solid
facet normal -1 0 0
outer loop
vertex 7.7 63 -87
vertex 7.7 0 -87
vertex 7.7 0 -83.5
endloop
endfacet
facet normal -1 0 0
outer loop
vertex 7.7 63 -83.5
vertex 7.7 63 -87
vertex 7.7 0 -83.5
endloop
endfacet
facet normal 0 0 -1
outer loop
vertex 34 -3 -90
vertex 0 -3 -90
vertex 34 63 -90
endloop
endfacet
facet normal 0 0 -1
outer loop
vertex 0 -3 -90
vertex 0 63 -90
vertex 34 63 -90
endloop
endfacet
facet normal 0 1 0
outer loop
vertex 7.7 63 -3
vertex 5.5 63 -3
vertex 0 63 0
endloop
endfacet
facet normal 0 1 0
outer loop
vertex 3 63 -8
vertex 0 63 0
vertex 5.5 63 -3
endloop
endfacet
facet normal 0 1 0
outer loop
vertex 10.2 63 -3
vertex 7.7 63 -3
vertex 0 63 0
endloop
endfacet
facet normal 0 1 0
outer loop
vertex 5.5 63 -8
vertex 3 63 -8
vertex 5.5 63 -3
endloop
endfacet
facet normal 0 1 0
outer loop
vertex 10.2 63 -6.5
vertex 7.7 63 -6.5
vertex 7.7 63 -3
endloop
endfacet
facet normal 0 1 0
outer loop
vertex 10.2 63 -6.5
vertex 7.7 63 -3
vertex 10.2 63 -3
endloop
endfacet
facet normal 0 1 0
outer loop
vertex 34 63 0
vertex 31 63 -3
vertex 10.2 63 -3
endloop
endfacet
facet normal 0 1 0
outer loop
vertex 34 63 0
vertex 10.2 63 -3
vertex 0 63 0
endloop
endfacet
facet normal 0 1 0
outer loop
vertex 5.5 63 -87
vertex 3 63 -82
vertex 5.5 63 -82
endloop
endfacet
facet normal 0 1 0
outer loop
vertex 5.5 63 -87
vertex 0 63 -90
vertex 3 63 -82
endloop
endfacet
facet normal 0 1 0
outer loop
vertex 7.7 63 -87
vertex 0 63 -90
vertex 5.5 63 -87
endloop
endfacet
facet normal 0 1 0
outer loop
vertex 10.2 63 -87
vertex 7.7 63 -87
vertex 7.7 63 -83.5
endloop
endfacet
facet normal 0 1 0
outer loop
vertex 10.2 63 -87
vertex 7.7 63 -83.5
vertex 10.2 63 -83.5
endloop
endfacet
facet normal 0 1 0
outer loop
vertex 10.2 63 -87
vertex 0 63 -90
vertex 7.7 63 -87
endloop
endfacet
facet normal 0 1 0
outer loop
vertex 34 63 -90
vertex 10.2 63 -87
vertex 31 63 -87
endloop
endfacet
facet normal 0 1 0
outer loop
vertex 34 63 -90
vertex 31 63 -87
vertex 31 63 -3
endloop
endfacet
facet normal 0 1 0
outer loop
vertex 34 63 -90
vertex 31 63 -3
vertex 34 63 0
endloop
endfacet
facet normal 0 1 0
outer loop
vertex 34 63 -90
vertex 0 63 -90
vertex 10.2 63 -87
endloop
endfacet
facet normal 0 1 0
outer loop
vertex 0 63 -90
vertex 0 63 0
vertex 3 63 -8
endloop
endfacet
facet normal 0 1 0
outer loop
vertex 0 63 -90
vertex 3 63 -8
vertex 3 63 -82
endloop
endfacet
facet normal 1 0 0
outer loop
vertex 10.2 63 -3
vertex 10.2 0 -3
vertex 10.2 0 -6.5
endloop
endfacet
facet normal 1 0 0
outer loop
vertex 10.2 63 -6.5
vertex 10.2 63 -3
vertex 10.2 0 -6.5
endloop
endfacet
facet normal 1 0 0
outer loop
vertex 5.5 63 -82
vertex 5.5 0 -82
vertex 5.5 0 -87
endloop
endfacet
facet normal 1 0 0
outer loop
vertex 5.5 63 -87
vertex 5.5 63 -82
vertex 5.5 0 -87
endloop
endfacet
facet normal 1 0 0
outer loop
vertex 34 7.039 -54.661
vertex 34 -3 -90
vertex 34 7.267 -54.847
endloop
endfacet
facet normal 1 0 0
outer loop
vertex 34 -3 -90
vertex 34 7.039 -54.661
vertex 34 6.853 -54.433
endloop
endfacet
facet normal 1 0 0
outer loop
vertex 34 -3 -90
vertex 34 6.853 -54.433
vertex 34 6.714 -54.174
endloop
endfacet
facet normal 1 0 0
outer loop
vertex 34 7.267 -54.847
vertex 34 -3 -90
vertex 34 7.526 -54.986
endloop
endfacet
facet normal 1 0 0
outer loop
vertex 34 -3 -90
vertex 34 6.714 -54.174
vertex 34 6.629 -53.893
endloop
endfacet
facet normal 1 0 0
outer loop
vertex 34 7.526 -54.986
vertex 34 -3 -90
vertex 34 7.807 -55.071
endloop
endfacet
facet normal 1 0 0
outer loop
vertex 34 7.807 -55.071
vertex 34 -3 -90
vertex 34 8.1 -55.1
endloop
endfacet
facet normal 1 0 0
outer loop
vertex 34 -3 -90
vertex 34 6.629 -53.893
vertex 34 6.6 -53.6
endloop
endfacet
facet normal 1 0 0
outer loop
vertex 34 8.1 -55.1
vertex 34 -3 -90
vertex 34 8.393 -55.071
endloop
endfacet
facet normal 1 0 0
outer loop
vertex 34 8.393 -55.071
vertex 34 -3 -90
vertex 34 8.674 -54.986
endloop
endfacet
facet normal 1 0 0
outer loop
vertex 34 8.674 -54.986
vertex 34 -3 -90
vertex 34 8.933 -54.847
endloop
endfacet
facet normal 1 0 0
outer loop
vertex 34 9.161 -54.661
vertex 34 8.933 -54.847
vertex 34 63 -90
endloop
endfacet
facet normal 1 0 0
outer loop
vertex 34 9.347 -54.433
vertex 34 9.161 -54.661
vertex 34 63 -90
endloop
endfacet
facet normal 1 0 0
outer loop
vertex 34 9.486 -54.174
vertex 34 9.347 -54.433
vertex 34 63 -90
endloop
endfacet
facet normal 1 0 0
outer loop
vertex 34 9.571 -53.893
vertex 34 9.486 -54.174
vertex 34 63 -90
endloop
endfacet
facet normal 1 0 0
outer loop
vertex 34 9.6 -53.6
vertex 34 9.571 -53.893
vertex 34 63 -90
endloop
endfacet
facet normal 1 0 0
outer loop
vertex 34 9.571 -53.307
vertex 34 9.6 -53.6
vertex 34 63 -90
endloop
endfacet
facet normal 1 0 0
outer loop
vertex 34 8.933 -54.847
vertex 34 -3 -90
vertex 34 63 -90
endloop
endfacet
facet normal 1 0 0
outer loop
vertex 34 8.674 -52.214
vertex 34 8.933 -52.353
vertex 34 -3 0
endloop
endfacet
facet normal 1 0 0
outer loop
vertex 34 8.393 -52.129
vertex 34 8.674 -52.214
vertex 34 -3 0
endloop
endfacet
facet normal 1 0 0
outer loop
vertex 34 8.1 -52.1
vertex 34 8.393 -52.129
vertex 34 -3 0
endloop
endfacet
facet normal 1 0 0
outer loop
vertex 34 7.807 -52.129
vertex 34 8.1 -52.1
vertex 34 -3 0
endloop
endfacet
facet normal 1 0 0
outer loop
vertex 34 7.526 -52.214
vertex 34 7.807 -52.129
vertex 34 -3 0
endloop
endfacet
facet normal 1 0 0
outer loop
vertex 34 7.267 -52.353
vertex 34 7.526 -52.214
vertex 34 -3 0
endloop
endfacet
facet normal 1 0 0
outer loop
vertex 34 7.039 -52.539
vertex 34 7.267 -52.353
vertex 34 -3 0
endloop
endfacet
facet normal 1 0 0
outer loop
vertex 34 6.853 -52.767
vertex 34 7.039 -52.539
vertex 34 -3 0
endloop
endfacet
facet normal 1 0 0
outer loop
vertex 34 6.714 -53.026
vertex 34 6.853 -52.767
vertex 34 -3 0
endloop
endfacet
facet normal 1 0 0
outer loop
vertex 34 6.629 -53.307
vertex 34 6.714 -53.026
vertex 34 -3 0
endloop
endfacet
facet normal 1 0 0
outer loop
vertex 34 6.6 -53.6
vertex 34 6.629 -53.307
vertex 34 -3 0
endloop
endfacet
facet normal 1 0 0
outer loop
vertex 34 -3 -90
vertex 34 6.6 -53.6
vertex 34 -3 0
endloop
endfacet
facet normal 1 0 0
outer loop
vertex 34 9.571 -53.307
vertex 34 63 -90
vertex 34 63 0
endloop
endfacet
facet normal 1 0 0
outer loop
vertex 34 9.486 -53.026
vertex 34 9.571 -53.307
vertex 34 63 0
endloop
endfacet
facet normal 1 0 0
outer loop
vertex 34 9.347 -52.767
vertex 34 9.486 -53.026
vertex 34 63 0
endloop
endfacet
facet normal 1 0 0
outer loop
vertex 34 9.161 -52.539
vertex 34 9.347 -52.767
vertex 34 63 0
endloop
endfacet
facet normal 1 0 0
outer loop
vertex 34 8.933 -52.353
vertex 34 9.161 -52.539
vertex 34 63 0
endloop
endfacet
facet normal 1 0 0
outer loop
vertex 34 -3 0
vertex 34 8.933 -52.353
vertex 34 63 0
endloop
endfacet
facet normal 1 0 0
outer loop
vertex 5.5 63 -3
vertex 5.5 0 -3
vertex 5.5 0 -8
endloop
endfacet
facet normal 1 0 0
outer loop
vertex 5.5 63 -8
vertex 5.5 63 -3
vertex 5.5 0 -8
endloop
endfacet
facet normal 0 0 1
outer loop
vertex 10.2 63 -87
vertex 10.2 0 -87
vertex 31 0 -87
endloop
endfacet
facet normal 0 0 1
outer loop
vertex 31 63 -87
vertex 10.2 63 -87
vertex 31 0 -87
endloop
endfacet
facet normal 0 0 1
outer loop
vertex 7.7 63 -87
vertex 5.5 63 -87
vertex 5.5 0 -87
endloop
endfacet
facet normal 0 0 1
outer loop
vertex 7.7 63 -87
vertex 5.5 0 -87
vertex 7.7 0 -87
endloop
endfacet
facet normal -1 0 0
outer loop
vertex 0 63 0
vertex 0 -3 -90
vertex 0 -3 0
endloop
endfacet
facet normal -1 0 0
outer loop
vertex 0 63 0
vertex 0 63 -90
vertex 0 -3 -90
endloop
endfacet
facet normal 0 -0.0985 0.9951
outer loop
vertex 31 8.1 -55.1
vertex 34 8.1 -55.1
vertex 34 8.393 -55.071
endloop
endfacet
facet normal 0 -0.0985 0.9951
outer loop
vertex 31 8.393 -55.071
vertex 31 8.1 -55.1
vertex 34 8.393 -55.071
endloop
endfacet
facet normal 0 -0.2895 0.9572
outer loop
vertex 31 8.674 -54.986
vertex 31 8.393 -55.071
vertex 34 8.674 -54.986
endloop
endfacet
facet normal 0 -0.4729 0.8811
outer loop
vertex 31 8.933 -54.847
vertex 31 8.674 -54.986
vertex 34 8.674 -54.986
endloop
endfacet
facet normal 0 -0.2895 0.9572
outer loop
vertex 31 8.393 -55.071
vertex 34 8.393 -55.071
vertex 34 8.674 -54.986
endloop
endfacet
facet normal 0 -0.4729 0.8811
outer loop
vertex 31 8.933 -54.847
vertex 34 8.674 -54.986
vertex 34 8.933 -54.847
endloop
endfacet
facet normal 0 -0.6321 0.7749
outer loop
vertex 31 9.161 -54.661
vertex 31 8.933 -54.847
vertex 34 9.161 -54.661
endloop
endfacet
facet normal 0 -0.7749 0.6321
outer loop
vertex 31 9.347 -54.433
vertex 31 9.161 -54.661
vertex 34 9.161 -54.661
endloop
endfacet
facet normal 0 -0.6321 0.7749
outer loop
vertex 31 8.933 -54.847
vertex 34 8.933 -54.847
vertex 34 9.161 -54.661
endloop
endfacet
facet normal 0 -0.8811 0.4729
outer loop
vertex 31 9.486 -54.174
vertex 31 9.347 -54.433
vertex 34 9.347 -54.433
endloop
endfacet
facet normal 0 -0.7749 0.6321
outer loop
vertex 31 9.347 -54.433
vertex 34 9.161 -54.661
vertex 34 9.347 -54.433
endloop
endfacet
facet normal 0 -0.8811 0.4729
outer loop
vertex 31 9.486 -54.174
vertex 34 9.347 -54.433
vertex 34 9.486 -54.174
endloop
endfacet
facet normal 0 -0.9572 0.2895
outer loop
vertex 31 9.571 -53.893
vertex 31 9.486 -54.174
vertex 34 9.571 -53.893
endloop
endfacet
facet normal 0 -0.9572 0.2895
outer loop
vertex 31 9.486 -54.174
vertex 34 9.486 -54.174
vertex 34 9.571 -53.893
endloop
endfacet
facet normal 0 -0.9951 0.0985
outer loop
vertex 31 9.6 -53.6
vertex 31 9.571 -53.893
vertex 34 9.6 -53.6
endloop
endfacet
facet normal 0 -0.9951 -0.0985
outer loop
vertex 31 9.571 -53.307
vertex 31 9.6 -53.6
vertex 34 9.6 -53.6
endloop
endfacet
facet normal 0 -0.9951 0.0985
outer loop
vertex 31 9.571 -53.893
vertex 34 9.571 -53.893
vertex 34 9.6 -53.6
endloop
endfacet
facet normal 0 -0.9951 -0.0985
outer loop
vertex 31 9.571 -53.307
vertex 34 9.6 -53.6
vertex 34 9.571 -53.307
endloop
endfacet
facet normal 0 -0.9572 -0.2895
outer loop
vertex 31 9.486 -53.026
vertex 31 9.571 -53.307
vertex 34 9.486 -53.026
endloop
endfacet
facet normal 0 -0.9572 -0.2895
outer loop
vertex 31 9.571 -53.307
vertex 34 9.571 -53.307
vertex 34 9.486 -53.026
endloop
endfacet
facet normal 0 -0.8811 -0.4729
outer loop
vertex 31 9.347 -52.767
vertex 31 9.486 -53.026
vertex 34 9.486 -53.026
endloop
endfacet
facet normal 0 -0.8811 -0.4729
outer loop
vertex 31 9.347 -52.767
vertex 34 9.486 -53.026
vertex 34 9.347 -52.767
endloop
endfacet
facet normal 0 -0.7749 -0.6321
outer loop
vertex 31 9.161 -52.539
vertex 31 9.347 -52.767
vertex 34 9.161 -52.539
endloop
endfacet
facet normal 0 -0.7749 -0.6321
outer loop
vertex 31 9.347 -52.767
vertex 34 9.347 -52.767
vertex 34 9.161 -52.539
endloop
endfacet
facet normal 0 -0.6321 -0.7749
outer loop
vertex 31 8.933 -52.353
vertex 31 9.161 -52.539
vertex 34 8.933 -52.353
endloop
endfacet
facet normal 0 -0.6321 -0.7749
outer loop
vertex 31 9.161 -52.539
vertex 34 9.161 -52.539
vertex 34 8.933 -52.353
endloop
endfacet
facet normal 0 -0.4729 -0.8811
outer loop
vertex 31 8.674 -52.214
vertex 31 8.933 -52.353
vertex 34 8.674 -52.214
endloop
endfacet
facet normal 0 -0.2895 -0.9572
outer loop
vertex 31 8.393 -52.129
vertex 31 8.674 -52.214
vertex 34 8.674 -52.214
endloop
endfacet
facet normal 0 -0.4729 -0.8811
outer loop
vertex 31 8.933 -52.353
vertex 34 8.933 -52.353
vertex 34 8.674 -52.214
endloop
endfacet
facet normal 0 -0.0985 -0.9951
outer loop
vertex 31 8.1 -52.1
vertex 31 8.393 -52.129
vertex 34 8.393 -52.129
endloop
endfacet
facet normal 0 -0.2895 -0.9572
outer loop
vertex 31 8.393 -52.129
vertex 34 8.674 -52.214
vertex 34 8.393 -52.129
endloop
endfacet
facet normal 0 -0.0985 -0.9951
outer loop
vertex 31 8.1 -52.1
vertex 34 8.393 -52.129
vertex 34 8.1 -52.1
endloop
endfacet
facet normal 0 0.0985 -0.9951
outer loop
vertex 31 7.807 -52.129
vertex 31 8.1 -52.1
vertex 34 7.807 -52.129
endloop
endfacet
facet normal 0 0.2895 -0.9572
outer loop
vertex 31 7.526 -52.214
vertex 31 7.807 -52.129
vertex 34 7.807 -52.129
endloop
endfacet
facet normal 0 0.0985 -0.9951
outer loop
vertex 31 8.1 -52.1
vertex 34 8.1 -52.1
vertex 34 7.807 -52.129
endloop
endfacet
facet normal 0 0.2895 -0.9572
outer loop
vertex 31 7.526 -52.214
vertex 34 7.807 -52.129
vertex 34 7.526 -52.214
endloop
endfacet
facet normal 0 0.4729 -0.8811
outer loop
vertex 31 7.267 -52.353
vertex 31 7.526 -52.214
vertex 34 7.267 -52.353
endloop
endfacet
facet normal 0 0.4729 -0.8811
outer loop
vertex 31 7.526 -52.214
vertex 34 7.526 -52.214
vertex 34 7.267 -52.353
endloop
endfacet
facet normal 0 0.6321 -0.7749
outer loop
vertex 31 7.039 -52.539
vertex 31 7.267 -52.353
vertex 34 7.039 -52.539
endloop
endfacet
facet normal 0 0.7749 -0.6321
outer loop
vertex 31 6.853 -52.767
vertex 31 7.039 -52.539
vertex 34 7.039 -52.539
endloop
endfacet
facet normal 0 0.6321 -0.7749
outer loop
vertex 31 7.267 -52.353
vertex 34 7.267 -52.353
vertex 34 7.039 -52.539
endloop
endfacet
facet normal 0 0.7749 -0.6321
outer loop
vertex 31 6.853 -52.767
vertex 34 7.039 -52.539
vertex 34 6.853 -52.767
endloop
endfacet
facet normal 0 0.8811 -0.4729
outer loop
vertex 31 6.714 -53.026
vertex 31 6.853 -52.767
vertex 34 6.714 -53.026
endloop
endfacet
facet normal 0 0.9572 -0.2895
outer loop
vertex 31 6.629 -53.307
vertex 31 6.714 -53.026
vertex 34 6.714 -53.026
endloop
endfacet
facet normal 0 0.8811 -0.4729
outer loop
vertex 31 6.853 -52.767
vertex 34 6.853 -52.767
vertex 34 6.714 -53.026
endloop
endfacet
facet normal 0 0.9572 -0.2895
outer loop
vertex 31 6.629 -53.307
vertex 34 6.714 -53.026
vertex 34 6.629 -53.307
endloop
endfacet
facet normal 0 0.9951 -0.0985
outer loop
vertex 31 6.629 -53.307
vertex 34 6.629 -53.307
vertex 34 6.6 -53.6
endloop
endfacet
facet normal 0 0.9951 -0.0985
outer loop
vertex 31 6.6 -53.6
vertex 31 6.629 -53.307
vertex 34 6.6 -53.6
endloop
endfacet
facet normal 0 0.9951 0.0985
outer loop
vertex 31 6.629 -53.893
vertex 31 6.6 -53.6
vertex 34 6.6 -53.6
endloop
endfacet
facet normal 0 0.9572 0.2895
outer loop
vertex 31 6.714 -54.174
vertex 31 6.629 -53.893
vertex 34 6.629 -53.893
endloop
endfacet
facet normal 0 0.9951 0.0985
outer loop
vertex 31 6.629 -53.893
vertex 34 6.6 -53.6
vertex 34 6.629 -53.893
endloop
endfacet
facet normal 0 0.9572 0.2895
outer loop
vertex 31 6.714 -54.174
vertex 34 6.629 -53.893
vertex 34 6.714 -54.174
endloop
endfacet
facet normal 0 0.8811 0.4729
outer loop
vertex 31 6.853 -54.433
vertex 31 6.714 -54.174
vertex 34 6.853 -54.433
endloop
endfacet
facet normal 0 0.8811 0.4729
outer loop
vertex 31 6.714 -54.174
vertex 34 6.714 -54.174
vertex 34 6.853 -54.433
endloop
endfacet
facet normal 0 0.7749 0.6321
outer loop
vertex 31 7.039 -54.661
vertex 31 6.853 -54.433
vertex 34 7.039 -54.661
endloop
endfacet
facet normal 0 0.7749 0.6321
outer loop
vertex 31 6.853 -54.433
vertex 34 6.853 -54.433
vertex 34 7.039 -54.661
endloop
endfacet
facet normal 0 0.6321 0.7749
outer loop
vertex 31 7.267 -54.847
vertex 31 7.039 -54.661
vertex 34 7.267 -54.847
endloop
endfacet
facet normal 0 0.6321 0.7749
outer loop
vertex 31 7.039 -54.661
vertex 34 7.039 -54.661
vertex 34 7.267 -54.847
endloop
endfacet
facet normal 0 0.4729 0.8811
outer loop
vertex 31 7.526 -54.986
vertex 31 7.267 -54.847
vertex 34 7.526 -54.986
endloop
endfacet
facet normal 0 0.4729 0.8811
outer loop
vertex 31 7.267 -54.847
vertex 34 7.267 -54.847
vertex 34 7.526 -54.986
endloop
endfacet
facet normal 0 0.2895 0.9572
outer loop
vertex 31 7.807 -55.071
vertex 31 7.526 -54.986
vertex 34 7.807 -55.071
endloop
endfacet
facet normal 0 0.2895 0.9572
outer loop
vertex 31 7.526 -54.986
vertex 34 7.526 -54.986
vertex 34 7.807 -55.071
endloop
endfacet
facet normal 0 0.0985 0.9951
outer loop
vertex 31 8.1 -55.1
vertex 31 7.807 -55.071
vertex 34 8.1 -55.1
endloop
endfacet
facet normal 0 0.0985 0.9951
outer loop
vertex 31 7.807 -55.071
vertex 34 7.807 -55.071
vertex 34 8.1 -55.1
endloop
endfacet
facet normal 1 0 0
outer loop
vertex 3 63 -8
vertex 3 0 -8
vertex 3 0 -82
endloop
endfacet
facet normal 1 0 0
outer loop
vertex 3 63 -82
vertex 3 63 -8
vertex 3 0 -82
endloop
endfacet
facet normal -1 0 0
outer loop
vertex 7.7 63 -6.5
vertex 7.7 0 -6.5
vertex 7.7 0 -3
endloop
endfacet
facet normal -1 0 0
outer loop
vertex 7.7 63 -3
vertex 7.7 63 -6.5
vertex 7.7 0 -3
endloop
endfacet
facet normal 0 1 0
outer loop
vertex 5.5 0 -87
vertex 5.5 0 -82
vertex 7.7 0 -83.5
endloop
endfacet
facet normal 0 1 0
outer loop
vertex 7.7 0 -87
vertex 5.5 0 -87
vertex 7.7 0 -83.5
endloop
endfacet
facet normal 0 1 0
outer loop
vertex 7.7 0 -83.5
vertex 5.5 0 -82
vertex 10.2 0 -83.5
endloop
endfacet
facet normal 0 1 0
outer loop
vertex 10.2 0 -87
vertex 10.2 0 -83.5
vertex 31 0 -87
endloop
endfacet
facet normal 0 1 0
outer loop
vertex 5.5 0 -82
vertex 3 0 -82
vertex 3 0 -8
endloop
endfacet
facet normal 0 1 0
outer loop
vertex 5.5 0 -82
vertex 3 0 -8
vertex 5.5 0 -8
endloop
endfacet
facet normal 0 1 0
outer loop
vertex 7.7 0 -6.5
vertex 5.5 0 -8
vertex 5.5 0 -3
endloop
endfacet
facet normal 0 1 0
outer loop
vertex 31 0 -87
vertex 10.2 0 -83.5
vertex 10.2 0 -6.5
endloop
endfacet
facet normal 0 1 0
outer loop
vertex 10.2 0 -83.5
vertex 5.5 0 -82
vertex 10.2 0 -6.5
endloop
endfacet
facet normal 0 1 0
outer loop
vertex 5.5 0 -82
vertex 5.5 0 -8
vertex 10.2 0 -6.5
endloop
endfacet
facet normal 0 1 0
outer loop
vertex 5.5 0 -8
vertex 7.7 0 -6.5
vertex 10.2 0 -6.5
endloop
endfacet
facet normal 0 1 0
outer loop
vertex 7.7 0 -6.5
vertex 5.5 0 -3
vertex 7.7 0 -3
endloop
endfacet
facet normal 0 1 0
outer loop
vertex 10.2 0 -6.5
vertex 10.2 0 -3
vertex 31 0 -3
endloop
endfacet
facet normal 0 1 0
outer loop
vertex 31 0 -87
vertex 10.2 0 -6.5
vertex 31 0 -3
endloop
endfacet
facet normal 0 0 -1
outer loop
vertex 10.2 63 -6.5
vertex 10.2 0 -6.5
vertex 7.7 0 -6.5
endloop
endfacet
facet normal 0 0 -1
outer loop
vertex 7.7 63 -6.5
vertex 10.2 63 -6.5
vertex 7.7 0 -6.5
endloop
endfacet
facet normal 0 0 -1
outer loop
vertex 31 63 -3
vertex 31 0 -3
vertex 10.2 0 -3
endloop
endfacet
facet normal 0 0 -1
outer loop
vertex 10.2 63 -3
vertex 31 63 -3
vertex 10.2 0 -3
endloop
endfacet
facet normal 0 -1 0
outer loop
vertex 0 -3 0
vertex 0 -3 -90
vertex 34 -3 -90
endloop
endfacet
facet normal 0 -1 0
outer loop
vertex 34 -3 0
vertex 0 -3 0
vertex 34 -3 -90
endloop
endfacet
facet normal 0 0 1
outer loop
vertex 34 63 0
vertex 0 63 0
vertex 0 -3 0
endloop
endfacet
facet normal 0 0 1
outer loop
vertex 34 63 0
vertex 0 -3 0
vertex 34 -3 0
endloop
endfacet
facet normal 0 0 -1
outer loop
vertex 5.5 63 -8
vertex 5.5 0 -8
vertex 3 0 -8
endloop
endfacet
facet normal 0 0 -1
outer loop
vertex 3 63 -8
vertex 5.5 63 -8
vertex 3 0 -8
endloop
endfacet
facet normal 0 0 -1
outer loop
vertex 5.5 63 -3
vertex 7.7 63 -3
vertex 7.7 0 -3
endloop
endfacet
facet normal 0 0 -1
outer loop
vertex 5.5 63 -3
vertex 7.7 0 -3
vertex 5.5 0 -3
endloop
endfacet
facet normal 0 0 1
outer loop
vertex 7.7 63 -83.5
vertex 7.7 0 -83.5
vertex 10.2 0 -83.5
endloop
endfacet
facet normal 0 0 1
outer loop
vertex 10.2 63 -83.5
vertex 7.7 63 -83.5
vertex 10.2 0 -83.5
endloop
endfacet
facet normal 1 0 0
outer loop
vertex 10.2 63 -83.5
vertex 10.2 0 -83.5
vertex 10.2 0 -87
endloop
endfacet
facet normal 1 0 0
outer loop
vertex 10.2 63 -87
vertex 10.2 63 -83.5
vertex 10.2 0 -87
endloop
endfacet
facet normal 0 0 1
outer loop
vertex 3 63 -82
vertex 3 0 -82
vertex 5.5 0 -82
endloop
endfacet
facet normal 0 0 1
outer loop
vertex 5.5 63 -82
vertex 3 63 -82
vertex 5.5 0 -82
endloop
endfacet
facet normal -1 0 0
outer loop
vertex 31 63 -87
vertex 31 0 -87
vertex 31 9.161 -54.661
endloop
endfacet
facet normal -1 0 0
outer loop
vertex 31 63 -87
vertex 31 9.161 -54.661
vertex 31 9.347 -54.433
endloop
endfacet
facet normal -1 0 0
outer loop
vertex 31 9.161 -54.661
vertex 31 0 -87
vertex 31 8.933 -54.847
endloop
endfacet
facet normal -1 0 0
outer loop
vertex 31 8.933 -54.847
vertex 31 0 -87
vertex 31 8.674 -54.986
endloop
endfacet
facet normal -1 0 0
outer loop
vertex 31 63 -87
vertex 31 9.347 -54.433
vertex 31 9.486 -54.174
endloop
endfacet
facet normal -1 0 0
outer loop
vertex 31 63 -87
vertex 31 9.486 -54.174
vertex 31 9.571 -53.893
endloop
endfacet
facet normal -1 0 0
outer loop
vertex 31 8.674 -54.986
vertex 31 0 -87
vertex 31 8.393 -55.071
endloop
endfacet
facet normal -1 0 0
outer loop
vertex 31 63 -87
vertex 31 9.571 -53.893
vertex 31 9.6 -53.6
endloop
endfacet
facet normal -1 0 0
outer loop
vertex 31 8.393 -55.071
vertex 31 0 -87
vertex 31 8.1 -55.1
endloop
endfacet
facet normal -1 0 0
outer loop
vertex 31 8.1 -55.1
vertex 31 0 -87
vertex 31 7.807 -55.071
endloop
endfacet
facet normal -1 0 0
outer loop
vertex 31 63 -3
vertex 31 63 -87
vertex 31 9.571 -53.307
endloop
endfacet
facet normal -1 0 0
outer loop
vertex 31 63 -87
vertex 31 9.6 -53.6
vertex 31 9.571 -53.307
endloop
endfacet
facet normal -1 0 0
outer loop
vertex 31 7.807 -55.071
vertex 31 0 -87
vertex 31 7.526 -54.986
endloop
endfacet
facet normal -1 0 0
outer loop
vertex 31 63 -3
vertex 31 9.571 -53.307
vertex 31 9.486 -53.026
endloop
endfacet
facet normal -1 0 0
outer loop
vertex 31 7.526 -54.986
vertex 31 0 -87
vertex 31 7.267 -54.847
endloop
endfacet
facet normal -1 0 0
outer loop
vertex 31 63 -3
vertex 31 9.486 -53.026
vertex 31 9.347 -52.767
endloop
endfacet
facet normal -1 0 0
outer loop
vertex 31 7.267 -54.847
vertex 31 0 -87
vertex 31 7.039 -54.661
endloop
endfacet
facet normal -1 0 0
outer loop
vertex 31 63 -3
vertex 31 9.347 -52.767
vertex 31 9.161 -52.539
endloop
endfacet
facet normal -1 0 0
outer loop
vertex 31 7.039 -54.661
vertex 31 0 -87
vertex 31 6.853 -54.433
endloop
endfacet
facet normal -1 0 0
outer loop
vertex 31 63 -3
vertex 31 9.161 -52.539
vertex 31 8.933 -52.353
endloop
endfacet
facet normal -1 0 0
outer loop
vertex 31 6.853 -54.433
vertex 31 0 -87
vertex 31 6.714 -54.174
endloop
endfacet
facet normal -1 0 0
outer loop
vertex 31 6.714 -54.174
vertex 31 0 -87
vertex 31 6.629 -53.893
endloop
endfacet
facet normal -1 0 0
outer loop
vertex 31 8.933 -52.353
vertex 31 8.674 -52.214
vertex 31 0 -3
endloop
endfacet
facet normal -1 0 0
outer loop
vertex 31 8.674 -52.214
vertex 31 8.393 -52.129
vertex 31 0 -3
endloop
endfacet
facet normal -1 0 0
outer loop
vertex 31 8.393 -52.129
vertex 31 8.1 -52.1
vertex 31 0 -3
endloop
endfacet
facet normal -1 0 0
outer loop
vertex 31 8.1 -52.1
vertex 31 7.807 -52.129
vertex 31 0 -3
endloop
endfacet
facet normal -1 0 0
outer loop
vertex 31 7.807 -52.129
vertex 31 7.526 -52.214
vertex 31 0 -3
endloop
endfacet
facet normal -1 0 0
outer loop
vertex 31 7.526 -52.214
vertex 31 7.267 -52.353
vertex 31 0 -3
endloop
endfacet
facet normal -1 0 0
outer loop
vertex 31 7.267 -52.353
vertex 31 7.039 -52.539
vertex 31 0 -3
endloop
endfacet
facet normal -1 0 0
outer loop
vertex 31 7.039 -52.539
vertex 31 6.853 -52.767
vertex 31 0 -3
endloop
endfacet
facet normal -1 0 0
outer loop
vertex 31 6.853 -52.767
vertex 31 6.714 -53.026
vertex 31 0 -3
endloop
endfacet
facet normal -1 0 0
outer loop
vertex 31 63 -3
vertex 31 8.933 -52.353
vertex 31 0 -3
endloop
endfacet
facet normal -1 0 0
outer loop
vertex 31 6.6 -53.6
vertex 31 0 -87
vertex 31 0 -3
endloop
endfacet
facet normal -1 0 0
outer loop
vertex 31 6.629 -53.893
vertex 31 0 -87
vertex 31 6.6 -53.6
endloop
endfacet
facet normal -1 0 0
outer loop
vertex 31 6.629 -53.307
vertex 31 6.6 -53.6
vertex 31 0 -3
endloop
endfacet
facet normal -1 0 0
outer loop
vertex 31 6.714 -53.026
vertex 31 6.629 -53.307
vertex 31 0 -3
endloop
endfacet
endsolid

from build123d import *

# Parameters (mm, degrees)
ESBO_O1_W                = 34
ESBO_O1_H                = 90
RESSALTO_EXTRUS_O1_DEPTH = 63
ESBO_O2_W                = 34
ESBO_O2_H                = 90
RESSALTO_EXTRUS_O2_DEPTH = 3
ESBO_O3_R                = 1.5
CORTE_EXTRUS_O1_DEPTH    = 3


with BuildPart() as part:
    # Esboço1 → Ressalto-extrusão1 (new body)
    with BuildSketch(Plane(origin=(0, 0, 0), x_dir=(1, 0, 0), z_dir=(0, 1, 0))):
        with Locations((17, 45)):
            Rectangle(ESBO_O1_W, ESBO_O1_H)
        Polygon((5.5, 8), (3, 8), (3, 82), (5.5, 82), (5.5, 87), (7.7, 87), (7.7, 83.5), (10.2, 83.5), (10.2, 87), (31, 87), (31, 3), (10.2, 3), (10.2, 6.5), (7.7, 6.5), (7.7, 3), (5.5, 3), align=None, mode=Mode.SUBTRACT)
    extrude(amount=RESSALTO_EXTRUS_O1_DEPTH)

    # Esboço2 → Ressalto-extrusão2 (add)
    with BuildSketch(Plane.XZ):
        with Locations((17, -45)):
            Rectangle(ESBO_O2_W, ESBO_O2_H)
    extrude(amount=RESSALTO_EXTRUS_O2_DEPTH)

    # Esboço3 → Corte-extrusão1 (cut)
    with BuildSketch(Plane(origin=(34, 0, 0), x_dir=(0, 0, -1), z_dir=(1, 0, 0))):
        with Locations((53.6, 8.1)):
            Circle(ESBO_O3_R)
    extrude(amount=-CORTE_EXTRUS_O1_DEPTH, mode=Mode.SUBTRACT)


solid = part.part
